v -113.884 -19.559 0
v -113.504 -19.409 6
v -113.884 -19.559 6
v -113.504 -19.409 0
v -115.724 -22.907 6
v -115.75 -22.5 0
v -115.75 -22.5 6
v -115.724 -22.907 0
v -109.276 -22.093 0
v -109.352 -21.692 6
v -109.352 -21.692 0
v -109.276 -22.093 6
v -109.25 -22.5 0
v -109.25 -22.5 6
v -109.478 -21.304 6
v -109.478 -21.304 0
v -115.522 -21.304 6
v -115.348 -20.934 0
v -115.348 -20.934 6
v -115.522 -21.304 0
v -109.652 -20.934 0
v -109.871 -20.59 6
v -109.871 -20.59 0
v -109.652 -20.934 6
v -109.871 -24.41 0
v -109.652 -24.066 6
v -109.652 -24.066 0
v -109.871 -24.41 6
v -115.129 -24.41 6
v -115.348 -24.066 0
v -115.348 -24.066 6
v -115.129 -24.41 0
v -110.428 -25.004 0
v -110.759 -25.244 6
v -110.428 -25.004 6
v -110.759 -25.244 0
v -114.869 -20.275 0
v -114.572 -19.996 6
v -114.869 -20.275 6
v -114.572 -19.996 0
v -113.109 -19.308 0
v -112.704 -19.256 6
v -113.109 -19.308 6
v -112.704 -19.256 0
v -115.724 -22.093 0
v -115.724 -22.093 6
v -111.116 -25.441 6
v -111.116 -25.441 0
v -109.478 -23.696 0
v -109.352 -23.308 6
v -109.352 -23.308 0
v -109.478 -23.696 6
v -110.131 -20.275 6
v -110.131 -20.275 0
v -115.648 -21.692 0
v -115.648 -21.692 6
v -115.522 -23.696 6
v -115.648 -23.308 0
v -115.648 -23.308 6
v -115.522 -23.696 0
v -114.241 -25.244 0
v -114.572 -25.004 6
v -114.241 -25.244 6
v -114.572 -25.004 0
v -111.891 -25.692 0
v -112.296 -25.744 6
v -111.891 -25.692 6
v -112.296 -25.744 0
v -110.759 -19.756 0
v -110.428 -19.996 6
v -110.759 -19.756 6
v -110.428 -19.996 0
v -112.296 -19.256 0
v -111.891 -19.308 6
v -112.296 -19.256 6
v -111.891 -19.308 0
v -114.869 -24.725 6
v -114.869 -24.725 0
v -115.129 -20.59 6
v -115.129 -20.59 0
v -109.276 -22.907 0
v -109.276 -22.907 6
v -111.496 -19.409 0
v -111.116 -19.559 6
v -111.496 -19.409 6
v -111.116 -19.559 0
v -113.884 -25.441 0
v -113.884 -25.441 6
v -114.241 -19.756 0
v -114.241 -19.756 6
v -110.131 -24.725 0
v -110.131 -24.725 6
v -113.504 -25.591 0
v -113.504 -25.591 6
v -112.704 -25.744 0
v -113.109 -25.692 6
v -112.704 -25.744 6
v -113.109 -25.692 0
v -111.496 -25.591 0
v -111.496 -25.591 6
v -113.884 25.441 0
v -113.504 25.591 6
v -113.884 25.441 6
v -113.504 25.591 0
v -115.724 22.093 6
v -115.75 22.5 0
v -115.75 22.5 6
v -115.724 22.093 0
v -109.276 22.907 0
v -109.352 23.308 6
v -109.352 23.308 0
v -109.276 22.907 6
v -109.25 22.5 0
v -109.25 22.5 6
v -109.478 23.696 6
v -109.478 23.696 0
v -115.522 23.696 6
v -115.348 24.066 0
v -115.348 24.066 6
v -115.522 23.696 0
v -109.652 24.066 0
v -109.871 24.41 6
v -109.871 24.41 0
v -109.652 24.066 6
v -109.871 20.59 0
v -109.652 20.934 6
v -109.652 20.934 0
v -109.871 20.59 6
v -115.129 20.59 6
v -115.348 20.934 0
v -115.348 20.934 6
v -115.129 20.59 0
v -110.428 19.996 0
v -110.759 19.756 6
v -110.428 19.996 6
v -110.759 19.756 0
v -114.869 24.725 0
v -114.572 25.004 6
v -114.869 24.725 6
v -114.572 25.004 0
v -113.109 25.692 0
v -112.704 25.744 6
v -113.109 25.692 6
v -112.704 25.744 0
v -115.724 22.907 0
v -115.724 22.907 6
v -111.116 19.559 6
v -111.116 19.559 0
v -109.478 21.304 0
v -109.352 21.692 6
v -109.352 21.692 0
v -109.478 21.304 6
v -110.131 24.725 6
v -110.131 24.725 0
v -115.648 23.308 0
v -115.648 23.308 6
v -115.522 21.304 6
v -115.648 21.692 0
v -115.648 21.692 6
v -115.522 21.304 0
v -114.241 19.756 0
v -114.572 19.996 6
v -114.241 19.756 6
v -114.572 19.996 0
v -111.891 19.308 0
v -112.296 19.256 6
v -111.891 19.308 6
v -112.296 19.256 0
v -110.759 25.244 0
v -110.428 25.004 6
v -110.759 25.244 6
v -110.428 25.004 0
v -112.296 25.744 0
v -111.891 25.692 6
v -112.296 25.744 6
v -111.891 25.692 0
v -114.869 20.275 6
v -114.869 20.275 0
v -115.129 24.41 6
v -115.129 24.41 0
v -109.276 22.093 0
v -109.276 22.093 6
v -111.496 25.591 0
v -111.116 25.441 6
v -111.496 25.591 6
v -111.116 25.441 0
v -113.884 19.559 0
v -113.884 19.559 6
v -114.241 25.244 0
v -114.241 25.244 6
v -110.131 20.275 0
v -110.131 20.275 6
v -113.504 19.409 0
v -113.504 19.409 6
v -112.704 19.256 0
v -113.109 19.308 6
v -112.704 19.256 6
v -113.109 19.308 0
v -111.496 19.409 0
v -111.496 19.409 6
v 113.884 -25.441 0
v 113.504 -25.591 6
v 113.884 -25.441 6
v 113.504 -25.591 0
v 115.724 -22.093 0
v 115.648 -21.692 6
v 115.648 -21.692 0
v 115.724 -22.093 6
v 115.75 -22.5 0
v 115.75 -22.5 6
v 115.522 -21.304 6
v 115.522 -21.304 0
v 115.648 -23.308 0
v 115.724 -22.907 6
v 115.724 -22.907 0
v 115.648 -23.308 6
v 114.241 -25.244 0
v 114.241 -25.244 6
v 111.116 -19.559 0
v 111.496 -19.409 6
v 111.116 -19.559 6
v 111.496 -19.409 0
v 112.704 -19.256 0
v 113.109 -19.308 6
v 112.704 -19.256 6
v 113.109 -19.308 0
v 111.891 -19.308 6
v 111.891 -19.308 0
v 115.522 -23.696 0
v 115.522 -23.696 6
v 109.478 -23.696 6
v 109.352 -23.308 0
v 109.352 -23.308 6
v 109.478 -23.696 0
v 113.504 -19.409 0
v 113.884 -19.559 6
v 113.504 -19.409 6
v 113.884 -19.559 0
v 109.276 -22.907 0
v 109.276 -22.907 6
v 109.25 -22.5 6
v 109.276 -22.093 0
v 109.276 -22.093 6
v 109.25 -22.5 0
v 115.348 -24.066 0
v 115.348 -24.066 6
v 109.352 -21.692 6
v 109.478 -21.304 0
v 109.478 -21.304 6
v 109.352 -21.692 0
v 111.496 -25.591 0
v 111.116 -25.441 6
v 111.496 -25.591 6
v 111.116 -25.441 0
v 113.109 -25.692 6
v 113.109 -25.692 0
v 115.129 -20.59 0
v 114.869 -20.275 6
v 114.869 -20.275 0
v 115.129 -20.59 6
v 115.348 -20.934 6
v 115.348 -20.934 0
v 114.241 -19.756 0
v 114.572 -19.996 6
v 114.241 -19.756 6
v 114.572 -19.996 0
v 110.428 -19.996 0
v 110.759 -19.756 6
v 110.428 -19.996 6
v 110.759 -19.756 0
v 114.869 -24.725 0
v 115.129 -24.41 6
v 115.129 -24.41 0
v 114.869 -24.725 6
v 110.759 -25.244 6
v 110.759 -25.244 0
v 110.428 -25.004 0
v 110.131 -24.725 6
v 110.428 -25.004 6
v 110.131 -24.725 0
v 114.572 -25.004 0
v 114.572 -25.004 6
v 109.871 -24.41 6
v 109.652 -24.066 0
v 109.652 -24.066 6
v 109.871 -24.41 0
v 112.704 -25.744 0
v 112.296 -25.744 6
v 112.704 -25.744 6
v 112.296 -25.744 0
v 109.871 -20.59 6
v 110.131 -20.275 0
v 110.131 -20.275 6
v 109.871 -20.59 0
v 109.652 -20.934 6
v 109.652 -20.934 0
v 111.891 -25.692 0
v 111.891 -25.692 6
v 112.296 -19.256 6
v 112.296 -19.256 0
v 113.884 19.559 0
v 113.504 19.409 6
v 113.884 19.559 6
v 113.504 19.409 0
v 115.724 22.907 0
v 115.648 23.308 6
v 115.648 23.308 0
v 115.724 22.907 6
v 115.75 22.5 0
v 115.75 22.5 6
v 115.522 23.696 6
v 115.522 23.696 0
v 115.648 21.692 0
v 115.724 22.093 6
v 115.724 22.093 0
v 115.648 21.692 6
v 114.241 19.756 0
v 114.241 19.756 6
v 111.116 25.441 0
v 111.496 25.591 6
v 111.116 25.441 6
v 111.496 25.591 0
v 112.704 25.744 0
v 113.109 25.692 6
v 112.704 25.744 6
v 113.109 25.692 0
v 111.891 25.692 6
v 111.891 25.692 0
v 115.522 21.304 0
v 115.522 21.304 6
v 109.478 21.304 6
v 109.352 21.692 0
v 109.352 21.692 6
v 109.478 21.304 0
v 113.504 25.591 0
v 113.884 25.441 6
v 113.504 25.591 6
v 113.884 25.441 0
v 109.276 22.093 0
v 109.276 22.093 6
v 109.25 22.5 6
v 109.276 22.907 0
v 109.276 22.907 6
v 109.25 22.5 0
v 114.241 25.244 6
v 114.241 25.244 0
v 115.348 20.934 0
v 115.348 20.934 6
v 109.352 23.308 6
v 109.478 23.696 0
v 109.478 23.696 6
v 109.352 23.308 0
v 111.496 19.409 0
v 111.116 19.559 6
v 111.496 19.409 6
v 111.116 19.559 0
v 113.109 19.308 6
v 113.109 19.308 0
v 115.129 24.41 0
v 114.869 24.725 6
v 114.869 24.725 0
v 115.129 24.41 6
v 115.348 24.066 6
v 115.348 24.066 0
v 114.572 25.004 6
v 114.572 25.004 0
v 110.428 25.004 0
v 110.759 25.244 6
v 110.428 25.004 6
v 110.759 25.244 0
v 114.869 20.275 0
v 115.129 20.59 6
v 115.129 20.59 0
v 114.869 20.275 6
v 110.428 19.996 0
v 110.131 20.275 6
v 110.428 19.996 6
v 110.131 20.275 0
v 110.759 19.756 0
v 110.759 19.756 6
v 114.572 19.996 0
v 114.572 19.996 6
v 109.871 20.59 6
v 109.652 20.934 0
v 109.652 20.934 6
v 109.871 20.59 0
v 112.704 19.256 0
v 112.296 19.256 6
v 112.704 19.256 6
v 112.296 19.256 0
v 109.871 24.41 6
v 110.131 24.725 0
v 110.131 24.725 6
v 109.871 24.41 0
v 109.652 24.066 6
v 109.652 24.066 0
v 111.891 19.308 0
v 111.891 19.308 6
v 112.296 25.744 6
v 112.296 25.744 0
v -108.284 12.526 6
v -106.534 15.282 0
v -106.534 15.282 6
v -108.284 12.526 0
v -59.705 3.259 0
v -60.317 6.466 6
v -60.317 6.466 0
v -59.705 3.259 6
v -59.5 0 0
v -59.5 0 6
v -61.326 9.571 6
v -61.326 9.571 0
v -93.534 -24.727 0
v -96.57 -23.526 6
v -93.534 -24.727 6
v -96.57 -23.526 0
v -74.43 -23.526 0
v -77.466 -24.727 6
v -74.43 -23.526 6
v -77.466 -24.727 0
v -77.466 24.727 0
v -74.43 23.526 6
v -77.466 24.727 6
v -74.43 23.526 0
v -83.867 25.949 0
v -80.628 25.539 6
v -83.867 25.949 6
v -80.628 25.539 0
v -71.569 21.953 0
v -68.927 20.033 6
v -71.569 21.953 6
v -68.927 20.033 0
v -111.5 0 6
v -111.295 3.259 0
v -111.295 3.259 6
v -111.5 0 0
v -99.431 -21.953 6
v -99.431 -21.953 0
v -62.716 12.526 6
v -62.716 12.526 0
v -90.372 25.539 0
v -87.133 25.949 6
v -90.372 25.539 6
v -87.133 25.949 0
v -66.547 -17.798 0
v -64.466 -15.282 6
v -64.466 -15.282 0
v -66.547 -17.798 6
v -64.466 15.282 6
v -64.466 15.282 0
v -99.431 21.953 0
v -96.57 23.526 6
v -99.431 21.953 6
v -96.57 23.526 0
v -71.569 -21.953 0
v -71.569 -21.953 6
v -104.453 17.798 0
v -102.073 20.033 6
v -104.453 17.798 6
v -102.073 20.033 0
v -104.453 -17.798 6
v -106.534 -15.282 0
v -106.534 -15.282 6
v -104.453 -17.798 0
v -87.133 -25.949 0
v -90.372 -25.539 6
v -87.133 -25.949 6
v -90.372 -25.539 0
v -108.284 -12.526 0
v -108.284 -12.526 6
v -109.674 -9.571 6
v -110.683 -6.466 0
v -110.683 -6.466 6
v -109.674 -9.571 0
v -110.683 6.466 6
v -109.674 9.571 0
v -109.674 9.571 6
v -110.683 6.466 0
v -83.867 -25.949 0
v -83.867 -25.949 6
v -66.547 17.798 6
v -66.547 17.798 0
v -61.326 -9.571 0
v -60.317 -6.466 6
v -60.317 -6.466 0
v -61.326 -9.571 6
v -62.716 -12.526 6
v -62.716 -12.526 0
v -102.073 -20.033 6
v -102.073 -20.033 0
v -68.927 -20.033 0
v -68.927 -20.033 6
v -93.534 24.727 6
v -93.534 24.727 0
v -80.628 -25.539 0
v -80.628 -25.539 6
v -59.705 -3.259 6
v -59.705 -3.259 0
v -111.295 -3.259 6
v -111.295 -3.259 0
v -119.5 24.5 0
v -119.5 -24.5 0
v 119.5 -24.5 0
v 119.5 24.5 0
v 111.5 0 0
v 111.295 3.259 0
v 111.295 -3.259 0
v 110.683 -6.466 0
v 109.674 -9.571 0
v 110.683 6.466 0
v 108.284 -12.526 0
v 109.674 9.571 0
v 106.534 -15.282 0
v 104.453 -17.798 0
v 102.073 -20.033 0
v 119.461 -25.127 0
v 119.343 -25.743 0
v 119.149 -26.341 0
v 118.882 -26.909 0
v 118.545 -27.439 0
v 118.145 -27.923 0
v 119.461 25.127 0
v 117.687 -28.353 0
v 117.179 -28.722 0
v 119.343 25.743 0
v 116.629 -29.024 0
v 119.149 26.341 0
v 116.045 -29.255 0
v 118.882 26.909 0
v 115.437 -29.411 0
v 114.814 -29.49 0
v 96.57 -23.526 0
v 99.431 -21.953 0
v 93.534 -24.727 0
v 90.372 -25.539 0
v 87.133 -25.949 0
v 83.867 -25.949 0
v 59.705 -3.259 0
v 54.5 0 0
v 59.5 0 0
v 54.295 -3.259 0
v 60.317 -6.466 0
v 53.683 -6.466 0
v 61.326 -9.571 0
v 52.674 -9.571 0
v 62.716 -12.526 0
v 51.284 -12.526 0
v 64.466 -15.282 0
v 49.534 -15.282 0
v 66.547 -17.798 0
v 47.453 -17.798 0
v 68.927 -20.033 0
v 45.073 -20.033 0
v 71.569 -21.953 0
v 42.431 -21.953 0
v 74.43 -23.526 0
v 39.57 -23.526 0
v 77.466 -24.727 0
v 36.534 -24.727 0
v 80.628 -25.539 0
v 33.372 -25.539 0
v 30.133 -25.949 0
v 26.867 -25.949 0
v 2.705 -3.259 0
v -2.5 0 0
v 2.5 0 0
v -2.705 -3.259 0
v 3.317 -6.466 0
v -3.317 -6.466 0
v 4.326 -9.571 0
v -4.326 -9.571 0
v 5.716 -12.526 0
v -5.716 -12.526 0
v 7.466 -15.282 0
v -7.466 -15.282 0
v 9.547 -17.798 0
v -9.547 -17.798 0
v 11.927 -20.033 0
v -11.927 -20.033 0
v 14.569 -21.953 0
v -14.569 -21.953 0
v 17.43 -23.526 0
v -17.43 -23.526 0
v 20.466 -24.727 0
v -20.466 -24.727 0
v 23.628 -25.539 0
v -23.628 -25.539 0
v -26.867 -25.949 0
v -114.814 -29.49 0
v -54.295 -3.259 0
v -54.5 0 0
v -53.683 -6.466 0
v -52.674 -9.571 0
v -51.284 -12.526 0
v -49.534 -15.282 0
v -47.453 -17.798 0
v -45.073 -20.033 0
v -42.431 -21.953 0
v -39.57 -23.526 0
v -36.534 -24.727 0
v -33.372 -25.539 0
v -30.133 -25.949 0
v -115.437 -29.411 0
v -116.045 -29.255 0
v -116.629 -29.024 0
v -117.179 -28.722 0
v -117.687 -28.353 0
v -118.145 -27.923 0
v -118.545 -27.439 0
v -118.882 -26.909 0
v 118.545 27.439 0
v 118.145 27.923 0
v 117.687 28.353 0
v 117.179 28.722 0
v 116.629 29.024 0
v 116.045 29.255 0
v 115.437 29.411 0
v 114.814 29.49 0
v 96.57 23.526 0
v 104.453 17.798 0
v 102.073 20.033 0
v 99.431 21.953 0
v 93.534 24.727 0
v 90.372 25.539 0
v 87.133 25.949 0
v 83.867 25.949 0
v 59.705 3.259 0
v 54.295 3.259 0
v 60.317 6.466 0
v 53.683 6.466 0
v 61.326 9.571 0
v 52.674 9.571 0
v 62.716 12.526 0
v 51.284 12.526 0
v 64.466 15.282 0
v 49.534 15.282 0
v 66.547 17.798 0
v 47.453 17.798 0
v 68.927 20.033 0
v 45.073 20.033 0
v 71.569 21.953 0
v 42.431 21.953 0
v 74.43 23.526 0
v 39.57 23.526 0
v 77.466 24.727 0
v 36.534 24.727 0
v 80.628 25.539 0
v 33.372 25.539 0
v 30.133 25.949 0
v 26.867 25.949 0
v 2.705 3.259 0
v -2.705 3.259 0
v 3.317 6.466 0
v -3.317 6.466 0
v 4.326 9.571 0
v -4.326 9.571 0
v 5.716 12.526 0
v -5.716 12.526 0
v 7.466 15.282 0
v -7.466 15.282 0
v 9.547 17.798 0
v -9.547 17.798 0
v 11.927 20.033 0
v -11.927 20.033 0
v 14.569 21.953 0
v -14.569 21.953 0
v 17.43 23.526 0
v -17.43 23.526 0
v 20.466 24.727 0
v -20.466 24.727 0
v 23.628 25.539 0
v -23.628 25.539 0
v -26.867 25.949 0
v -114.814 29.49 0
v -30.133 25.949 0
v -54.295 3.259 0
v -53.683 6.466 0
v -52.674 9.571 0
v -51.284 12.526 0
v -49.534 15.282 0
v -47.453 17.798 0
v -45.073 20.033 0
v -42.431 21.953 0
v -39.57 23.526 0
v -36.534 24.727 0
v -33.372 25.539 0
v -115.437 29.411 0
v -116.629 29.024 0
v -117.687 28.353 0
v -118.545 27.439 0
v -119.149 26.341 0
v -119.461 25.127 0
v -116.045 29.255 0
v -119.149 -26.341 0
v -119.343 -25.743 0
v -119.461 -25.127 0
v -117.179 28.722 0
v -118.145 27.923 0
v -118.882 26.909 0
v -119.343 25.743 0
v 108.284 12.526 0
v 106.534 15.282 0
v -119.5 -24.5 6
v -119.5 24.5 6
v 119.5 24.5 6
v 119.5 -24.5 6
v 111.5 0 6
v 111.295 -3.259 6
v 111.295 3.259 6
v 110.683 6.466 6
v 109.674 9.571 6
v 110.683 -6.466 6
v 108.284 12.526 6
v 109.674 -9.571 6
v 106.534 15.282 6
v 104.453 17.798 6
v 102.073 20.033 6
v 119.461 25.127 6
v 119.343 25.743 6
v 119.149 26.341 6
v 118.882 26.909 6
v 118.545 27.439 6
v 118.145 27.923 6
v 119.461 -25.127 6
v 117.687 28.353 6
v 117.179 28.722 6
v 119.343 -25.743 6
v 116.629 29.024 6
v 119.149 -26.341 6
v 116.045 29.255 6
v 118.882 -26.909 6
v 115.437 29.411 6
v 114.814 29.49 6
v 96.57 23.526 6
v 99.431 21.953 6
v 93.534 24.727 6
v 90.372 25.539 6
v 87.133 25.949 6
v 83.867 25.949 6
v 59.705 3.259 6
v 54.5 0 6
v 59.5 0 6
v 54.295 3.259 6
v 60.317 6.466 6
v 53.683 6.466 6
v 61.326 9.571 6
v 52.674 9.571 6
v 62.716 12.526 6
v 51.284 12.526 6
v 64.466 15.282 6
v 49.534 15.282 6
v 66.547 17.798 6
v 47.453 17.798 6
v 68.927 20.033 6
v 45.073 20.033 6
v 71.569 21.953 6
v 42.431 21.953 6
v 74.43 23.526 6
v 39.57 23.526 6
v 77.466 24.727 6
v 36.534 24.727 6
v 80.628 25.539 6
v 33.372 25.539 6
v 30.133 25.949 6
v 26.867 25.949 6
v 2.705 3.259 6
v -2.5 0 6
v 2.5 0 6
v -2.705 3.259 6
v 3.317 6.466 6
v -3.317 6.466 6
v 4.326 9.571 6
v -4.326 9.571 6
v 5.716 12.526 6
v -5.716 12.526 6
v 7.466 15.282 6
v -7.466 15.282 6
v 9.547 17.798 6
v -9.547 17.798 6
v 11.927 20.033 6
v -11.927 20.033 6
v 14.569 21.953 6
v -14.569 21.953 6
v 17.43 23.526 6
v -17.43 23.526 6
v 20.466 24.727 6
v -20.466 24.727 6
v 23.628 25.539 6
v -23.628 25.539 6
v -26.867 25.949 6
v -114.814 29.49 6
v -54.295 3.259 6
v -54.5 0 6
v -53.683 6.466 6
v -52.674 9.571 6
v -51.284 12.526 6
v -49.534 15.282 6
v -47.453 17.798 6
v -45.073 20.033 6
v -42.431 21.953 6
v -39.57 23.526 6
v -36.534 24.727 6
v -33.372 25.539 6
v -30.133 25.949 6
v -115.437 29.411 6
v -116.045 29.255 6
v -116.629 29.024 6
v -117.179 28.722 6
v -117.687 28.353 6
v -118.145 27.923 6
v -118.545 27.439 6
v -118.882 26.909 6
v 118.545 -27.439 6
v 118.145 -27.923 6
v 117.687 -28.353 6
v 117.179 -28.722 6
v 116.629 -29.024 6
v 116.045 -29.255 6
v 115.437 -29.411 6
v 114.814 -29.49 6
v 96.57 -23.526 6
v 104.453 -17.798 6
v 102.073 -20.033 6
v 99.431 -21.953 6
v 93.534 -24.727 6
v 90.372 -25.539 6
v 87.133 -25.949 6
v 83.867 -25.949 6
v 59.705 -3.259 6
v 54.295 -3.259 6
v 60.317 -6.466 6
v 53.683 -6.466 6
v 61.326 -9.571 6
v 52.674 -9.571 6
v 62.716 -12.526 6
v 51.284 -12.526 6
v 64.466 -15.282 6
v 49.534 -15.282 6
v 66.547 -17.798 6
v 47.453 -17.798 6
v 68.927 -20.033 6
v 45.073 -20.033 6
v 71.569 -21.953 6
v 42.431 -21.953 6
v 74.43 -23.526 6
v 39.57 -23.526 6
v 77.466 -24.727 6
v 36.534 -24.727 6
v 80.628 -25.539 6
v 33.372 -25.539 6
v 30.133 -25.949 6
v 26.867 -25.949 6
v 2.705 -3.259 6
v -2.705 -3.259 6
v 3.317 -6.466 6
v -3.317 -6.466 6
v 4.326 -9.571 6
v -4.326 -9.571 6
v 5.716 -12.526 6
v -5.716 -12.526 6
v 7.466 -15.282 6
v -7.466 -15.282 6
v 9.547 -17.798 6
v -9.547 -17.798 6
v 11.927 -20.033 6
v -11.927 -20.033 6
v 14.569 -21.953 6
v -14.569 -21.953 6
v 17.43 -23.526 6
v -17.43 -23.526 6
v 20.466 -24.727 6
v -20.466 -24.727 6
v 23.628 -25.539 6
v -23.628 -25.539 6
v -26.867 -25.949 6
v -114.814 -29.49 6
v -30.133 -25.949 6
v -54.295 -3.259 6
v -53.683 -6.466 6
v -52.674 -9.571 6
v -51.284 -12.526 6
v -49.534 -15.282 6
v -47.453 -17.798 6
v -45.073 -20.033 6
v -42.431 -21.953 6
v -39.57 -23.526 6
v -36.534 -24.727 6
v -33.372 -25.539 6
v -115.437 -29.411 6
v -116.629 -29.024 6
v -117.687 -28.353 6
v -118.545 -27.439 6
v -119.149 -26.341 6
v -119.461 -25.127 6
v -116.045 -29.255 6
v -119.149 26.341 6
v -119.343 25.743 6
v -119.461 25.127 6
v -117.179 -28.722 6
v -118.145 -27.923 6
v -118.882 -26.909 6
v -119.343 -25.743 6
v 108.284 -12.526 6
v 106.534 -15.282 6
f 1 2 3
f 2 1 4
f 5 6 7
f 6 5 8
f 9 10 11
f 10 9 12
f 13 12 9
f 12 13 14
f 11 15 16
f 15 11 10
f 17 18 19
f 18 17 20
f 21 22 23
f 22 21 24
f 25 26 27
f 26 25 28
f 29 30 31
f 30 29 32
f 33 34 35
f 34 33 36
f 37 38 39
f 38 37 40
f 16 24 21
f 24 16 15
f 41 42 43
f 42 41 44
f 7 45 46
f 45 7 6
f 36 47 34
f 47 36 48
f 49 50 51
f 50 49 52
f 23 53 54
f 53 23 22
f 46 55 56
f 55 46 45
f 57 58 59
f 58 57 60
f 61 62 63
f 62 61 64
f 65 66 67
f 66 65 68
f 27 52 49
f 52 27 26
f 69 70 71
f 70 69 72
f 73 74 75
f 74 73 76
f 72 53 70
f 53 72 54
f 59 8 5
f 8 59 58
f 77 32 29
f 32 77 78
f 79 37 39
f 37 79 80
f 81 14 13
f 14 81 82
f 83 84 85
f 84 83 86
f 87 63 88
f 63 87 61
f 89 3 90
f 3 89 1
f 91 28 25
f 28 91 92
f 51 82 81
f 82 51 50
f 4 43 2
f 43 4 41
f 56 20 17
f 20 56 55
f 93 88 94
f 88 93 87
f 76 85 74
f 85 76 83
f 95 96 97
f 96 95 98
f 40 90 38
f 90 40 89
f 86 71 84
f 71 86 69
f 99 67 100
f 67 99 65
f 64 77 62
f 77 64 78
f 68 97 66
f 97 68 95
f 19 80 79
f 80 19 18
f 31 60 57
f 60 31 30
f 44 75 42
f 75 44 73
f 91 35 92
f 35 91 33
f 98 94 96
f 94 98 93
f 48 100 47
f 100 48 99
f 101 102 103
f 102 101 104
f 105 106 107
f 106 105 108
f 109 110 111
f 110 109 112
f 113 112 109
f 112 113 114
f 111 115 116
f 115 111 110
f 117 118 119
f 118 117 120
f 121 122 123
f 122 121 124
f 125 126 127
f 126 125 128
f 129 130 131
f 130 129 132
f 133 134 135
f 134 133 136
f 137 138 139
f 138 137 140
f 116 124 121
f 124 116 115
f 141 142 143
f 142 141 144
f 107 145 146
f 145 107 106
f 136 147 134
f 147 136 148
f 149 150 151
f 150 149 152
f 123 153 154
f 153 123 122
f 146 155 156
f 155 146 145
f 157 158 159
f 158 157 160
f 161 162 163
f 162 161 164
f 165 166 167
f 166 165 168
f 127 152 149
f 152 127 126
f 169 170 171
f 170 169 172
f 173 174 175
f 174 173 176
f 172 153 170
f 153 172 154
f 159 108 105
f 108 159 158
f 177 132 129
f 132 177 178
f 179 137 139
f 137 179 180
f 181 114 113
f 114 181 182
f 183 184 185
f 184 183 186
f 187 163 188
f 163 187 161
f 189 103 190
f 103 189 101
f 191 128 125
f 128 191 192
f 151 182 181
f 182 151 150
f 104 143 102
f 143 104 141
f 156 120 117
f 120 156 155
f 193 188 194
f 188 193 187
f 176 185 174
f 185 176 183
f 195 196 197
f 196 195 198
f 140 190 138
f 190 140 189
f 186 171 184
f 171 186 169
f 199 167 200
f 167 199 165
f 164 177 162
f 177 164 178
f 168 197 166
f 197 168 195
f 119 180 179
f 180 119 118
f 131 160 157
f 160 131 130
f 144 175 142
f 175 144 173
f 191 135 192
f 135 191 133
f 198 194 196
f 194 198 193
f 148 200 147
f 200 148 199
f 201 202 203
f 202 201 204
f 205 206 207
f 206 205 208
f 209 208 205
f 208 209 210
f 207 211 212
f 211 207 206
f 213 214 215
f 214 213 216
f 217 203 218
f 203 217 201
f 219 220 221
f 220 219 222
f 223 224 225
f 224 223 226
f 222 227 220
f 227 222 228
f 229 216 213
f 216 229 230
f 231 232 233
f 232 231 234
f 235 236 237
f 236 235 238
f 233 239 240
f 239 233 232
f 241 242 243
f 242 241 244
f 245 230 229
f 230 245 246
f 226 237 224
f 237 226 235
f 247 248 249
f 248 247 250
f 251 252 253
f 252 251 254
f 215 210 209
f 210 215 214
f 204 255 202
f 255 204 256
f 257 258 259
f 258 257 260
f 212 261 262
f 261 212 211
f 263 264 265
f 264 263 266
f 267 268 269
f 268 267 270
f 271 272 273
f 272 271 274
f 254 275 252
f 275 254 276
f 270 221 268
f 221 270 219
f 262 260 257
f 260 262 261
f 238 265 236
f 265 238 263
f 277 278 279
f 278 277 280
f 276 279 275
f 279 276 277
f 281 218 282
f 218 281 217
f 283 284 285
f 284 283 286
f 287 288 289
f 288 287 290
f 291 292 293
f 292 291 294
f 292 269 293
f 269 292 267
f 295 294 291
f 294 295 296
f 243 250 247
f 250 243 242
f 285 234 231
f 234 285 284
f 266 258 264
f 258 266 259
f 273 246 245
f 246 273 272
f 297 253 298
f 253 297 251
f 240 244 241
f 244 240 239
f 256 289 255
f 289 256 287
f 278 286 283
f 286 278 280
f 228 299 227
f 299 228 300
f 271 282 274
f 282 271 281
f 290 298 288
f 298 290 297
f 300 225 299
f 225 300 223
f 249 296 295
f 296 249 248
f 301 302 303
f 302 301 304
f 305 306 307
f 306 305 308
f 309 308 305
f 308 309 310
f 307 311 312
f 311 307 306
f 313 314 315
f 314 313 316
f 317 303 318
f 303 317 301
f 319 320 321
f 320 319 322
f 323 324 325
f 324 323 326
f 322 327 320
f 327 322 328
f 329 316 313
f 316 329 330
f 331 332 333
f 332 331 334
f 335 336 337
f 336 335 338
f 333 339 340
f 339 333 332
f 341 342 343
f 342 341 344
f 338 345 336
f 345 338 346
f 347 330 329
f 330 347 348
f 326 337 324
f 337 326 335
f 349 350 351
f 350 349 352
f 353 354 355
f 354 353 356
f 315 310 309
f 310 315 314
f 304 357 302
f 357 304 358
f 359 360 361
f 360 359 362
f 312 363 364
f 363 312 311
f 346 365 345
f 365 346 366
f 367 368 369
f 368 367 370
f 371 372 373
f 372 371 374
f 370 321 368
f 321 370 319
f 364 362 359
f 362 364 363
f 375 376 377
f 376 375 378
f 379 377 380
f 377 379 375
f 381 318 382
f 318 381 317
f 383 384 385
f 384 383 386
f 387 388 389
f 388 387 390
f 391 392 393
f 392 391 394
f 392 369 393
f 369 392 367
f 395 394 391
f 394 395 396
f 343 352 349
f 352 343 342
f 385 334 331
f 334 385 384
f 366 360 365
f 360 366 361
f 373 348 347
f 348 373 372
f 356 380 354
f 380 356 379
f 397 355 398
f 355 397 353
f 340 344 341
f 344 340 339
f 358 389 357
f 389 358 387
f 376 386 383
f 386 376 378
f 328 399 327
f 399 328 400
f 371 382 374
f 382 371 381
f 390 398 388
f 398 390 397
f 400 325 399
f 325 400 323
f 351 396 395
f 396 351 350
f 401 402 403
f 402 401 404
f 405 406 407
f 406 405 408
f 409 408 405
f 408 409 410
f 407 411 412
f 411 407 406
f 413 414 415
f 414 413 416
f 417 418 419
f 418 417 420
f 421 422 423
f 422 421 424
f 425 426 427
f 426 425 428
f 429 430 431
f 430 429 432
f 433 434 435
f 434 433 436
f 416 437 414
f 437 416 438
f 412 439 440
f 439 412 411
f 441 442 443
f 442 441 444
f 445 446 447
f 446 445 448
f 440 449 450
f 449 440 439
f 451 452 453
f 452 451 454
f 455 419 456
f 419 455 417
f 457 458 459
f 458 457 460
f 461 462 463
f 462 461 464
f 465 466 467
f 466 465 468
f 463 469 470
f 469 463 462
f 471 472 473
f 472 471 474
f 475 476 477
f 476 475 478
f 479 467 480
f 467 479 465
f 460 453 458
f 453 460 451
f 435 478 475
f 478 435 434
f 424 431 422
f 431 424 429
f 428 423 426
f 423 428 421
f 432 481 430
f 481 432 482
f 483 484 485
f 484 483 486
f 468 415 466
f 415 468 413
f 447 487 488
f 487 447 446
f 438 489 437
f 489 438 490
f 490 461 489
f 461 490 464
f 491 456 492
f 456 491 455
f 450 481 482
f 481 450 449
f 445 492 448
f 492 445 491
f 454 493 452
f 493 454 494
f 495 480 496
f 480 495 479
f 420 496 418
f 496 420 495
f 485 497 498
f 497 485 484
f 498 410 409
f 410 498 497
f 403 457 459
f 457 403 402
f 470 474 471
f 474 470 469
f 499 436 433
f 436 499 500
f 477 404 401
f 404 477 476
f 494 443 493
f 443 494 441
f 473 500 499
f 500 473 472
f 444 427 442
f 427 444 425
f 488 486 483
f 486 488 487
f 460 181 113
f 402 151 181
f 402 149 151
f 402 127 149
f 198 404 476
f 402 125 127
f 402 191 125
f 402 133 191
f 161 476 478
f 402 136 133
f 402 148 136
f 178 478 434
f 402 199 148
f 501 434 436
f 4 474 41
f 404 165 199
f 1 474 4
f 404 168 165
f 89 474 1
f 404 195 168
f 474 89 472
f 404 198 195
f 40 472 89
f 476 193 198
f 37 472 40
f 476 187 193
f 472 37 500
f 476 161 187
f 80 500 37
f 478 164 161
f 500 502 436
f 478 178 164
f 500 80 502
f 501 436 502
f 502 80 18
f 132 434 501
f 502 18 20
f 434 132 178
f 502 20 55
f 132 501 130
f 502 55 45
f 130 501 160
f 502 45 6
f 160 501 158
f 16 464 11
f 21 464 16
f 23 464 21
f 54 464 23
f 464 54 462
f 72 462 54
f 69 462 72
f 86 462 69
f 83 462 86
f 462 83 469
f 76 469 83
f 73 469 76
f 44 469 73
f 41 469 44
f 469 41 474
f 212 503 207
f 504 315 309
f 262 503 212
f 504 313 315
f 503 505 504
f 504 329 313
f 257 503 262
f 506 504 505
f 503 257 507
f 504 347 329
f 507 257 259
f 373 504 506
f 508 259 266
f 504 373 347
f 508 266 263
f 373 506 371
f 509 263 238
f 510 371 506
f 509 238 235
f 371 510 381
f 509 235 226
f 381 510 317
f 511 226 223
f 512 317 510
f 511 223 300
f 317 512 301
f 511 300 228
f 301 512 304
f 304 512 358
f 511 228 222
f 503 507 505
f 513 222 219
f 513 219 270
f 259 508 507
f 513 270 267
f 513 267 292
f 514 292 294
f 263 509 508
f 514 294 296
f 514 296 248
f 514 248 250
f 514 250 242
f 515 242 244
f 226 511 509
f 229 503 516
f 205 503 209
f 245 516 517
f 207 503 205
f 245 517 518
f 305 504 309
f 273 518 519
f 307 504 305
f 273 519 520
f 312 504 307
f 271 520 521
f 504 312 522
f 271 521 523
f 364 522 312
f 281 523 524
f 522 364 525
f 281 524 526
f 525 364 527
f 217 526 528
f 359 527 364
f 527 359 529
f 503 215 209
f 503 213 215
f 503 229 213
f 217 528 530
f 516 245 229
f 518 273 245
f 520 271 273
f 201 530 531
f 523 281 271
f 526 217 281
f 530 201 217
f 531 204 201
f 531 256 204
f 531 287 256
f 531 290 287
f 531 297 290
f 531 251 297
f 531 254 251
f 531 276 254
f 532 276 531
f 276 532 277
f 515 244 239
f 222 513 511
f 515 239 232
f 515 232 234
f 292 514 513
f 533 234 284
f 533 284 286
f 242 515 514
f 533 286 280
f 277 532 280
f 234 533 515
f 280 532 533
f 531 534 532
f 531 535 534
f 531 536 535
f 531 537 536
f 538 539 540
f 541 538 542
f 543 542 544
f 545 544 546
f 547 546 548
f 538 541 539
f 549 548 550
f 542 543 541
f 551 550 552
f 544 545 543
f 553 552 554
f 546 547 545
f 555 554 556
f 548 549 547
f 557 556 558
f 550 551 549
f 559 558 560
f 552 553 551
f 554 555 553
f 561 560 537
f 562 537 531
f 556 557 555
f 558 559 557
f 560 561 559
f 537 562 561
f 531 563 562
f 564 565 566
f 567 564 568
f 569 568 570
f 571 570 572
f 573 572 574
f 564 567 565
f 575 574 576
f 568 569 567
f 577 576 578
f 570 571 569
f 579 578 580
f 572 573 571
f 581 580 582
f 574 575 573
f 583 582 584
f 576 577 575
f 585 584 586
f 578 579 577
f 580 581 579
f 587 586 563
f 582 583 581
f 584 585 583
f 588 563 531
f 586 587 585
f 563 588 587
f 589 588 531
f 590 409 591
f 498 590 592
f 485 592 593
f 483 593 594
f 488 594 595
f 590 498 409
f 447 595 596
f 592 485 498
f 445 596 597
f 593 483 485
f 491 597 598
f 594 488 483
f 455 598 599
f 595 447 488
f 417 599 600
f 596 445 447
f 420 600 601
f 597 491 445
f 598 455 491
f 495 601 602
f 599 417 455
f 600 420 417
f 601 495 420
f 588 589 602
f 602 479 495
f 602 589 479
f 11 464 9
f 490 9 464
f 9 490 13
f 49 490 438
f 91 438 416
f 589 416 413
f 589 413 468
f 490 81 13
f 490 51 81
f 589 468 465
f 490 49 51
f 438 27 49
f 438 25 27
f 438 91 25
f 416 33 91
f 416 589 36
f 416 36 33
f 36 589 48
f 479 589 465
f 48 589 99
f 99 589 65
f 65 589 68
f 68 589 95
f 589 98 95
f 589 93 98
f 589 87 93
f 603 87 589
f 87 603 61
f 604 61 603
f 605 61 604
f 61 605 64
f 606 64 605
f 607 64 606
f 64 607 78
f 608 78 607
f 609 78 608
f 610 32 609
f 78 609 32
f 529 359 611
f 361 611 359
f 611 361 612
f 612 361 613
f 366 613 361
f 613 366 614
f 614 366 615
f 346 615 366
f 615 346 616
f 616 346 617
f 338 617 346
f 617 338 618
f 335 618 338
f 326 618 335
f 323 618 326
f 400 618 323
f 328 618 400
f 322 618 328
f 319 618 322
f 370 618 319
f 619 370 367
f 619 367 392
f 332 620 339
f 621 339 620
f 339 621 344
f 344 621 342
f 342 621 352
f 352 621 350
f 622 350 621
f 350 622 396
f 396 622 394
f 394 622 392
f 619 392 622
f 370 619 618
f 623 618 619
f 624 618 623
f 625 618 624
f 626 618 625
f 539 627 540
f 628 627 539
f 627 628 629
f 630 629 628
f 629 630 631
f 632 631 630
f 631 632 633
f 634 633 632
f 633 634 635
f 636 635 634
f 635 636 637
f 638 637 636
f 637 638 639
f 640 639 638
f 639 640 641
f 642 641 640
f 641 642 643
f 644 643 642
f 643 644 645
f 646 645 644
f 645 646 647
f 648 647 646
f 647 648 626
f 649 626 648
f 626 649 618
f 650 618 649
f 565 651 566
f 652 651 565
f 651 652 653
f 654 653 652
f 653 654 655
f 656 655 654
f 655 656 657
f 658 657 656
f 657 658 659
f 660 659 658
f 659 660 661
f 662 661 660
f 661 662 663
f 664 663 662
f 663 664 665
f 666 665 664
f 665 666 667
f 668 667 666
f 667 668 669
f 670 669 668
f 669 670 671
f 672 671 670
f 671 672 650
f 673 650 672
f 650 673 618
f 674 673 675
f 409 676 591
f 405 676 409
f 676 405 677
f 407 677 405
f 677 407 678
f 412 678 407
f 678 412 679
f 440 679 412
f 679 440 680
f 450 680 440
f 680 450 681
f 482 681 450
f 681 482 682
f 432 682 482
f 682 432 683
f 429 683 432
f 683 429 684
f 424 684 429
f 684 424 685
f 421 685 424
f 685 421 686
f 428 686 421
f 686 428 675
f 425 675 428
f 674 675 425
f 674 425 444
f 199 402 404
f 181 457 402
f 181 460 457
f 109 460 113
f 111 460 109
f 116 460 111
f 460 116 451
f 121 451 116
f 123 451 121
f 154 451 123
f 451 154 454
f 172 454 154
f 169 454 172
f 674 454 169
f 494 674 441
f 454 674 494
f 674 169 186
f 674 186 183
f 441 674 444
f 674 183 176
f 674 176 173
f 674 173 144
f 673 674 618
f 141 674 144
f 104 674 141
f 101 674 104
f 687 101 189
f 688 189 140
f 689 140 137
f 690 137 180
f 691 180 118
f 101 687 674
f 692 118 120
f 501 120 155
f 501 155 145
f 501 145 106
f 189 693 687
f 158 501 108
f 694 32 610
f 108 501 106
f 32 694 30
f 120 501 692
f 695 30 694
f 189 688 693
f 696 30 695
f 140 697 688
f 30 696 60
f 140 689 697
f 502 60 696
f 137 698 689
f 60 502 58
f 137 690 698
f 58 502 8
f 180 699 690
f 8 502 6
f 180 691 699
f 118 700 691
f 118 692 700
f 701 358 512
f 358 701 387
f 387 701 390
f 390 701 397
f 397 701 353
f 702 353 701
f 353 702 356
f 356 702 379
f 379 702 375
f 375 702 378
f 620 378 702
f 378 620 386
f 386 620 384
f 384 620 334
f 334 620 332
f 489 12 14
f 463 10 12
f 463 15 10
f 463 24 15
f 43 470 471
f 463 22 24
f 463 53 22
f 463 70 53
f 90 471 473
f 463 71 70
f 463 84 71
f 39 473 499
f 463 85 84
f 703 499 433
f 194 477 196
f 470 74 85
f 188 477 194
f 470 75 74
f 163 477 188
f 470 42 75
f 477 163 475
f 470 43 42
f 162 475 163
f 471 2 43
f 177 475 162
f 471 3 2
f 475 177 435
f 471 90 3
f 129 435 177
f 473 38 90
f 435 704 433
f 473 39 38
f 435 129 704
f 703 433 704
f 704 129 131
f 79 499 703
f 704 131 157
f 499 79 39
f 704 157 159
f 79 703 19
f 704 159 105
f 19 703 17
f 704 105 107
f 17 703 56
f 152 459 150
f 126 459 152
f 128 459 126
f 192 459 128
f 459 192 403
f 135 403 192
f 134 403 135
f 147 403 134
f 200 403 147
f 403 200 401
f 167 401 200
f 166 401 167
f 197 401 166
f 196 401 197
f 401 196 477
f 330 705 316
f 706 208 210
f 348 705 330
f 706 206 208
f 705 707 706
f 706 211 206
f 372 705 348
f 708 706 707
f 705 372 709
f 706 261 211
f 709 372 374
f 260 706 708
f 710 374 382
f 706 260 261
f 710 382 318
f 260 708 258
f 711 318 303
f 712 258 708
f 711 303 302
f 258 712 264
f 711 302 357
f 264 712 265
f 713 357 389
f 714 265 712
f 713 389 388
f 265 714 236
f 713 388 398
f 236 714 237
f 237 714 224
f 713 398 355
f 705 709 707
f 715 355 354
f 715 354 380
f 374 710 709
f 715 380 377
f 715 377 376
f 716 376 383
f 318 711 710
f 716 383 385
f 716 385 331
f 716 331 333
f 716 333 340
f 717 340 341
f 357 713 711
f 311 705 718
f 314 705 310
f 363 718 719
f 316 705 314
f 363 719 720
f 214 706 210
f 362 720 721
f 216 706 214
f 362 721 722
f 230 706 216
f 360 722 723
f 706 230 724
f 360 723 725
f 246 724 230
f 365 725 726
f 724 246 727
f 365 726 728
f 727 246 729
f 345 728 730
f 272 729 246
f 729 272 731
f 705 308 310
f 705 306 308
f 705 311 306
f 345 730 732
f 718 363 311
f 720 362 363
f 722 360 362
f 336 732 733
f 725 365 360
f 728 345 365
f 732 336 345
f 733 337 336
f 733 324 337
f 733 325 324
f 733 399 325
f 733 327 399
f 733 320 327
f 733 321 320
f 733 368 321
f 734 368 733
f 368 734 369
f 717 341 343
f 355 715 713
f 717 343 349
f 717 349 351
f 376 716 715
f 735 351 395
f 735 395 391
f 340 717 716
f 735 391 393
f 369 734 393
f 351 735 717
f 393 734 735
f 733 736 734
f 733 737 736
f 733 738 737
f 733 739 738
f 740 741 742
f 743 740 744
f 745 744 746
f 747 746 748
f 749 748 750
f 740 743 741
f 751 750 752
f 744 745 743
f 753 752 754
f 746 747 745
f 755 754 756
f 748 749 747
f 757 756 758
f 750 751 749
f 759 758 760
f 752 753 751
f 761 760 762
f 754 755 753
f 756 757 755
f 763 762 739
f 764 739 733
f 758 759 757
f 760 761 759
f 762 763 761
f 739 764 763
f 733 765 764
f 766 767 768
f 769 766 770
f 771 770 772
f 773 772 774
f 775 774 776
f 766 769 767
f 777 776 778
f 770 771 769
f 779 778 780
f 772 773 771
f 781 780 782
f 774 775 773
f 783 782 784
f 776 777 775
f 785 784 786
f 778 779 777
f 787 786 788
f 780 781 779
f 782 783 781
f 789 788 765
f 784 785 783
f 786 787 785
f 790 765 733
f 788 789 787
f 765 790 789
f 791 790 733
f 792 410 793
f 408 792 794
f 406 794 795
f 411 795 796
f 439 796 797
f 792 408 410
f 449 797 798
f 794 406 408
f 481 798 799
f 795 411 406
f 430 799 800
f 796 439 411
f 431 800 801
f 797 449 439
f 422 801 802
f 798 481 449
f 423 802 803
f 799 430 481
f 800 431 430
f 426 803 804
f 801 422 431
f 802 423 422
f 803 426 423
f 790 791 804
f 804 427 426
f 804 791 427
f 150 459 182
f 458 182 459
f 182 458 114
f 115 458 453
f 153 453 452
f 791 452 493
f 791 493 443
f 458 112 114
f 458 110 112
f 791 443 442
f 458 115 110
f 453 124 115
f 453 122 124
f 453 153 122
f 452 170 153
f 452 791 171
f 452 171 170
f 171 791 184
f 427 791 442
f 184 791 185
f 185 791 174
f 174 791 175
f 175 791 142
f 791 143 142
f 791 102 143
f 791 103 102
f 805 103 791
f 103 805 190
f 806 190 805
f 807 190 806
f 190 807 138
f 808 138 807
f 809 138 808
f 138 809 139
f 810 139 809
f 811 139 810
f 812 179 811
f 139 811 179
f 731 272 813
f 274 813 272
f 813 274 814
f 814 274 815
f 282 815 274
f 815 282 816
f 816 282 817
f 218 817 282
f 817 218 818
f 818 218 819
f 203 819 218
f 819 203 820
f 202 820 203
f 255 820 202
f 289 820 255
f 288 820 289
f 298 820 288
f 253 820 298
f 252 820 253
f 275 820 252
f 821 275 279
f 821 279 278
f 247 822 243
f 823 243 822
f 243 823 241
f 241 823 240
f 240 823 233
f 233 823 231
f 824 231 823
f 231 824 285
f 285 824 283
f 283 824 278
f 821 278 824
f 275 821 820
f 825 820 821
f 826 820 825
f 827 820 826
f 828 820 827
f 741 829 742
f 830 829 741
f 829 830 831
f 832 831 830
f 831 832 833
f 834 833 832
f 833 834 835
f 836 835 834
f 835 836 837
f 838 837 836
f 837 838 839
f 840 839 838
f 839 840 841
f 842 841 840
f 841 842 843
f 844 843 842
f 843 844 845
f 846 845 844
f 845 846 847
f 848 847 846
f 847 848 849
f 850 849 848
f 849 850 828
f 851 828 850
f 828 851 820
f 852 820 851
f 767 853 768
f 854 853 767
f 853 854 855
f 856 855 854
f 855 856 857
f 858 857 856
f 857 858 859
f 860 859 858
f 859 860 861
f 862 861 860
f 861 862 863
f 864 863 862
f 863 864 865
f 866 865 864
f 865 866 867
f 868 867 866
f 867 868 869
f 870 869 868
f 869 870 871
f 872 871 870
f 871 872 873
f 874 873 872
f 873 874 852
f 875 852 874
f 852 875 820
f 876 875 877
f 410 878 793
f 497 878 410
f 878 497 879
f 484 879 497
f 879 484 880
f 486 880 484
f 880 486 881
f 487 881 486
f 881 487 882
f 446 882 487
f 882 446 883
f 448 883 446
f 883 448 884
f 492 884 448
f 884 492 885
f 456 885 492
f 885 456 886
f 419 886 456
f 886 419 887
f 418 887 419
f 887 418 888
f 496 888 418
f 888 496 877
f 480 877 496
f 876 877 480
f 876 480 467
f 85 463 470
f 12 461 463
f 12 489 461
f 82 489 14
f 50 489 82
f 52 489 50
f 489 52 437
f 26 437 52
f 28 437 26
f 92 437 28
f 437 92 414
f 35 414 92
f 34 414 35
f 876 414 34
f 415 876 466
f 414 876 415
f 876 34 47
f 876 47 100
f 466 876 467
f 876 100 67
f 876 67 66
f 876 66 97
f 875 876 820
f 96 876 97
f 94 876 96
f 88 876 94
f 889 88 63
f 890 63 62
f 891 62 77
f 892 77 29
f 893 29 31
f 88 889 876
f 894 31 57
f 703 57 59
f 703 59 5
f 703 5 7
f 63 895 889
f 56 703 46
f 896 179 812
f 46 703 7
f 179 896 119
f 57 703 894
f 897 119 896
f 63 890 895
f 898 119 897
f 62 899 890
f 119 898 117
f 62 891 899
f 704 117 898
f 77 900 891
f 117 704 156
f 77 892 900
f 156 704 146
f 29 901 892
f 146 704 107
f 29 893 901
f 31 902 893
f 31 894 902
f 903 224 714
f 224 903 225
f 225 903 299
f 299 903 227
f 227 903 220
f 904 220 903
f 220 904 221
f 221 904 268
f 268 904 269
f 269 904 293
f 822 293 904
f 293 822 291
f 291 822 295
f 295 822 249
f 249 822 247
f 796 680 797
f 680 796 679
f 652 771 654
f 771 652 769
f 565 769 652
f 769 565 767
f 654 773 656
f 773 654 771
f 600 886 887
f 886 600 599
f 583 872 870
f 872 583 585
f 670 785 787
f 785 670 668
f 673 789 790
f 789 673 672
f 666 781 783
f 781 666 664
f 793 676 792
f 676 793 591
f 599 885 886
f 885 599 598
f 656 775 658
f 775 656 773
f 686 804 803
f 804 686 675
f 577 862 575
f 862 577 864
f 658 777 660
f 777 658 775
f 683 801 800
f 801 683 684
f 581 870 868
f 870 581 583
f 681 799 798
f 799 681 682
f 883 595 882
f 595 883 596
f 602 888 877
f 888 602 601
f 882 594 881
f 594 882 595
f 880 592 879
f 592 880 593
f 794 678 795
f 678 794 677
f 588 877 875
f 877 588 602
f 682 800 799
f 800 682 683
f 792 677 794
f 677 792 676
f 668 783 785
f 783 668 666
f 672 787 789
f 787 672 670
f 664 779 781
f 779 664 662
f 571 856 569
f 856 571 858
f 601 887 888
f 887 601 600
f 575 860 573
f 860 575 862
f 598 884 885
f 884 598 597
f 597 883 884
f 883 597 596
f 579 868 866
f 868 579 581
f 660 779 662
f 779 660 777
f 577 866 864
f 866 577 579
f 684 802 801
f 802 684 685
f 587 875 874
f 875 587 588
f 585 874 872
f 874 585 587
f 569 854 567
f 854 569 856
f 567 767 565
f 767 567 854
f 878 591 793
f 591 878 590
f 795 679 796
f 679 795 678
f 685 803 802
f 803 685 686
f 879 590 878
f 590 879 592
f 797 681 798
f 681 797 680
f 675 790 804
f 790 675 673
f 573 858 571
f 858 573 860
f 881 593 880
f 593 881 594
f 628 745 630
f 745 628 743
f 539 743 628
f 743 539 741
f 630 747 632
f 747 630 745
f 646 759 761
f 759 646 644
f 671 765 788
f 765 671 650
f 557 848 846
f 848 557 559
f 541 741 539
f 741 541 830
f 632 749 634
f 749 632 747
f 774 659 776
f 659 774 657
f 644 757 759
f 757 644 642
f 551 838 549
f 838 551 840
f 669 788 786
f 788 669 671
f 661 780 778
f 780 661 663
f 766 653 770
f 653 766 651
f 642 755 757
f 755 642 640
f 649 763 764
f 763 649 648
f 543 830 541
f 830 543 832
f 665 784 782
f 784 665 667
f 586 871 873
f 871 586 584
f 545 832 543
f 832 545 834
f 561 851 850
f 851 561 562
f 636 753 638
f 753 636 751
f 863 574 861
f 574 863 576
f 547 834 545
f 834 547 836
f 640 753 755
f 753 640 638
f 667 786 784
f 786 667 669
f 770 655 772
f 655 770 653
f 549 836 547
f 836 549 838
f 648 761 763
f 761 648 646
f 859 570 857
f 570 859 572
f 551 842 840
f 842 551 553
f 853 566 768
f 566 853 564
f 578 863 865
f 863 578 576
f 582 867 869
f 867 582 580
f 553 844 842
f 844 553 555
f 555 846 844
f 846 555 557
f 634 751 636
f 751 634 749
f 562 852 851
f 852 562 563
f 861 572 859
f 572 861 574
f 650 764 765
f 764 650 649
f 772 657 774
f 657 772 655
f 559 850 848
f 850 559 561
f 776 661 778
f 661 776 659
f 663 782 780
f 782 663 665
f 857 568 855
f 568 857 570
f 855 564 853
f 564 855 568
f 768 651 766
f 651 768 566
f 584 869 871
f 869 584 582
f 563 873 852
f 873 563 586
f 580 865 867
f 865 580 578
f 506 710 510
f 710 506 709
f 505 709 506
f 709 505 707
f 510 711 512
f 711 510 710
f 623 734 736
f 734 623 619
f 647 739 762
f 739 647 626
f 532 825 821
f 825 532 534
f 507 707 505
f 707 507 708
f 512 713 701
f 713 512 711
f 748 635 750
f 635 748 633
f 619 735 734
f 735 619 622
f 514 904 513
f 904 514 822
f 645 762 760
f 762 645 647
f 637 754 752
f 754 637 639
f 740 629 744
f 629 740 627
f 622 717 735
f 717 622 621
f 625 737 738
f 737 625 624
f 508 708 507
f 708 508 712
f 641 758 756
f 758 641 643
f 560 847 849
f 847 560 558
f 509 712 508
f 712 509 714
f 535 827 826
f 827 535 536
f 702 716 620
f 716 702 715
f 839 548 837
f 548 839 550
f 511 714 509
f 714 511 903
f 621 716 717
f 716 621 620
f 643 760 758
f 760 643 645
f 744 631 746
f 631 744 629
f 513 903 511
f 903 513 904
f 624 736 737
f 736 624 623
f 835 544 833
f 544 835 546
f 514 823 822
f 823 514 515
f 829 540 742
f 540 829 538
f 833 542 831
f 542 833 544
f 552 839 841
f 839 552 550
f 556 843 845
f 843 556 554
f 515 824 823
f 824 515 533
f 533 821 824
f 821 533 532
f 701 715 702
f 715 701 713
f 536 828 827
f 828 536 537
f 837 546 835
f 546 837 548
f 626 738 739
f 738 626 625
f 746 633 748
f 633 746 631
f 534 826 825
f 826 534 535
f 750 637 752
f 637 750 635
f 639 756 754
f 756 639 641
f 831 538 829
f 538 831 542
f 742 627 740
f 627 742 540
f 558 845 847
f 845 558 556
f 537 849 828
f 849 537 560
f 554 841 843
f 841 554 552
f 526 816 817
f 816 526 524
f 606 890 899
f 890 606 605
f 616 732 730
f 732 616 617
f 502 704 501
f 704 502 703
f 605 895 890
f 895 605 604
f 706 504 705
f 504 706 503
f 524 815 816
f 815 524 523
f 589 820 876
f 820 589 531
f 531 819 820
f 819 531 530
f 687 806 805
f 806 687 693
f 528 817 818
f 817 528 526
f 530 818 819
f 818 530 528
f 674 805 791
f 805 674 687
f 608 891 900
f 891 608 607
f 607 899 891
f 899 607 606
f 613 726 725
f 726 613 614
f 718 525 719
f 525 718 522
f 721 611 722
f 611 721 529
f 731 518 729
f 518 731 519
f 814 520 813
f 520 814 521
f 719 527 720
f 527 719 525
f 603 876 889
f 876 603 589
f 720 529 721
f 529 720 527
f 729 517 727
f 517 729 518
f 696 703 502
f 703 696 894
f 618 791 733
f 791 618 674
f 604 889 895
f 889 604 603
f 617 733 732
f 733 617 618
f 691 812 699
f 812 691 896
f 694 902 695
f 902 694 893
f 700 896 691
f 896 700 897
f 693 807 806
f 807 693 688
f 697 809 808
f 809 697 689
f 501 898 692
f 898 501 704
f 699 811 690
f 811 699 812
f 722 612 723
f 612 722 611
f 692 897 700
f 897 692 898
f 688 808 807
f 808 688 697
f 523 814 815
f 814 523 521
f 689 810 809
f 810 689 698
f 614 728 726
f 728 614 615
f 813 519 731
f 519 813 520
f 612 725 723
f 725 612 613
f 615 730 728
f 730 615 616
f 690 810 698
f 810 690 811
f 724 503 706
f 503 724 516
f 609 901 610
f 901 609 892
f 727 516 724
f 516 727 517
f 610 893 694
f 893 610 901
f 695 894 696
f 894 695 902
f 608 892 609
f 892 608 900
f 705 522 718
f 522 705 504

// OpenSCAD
$fn = 50;

difference() {
	union() {
		hull() {
			translate(v = [-114.5, 24.5, 0]) {
				cylinder(h = 6, r = 5);
			}
			translate(v = [114.5, 24.5, 0]) {
				cylinder(h = 6, r = 5);
			}
			translate(v = [-114.5, -24.5, 0]) {
				cylinder(h = 6, r = 5);
			}
			translate(v = [114.5, -24.5, 0]) {
				cylinder(h = 6, r = 5);
			}
		}
	}
	union() {
		translate(v = [-112.5, -22.5, -100.0]) {
			cylinder(h = 200, r = 3.25);
		}
		translate(v = [-112.5, 22.5, -100.0]) {
			cylinder(h = 200, r = 3.25);
		}
		translate(v = [112.5, -22.5, -100.0]) {
			cylinder(h = 200, r = 3.25);
		}
		translate(v = [112.5, 22.5, -100.0]) {
			cylinder(h = 200, r = 3.25);
		}
		translate(v = [-112.5, -22.5, -100.0]) {
			cylinder(h = 200, r = 1.8);
		}
		translate(v = [-112.5, 22.5, -100.0]) {
			cylinder(h = 200, r = 1.8);
		}
		translate(v = [112.5, -22.5, -100.0]) {
			cylinder(h = 200, r = 1.8);
		}
		translate(v = [112.5, 22.5, -100.0]) {
			cylinder(h = 200, r = 1.8);
		}
		translate(v = [-85.5, 0, 0.0]) {
			cylinder(h = 6, r = 26.0);
		}
		translate(v = [-28.5, 0, 0.0]) {
			cylinder(h = 6, r = 26.0);
		}
		translate(v = [28.5, 0, 0.0]) {
			cylinder(h = 6, r = 26.0);
		}
		translate(v = [85.5, 0, 0.0]) {
			cylinder(h = 6, r = 26.0);
		}
	}
}
